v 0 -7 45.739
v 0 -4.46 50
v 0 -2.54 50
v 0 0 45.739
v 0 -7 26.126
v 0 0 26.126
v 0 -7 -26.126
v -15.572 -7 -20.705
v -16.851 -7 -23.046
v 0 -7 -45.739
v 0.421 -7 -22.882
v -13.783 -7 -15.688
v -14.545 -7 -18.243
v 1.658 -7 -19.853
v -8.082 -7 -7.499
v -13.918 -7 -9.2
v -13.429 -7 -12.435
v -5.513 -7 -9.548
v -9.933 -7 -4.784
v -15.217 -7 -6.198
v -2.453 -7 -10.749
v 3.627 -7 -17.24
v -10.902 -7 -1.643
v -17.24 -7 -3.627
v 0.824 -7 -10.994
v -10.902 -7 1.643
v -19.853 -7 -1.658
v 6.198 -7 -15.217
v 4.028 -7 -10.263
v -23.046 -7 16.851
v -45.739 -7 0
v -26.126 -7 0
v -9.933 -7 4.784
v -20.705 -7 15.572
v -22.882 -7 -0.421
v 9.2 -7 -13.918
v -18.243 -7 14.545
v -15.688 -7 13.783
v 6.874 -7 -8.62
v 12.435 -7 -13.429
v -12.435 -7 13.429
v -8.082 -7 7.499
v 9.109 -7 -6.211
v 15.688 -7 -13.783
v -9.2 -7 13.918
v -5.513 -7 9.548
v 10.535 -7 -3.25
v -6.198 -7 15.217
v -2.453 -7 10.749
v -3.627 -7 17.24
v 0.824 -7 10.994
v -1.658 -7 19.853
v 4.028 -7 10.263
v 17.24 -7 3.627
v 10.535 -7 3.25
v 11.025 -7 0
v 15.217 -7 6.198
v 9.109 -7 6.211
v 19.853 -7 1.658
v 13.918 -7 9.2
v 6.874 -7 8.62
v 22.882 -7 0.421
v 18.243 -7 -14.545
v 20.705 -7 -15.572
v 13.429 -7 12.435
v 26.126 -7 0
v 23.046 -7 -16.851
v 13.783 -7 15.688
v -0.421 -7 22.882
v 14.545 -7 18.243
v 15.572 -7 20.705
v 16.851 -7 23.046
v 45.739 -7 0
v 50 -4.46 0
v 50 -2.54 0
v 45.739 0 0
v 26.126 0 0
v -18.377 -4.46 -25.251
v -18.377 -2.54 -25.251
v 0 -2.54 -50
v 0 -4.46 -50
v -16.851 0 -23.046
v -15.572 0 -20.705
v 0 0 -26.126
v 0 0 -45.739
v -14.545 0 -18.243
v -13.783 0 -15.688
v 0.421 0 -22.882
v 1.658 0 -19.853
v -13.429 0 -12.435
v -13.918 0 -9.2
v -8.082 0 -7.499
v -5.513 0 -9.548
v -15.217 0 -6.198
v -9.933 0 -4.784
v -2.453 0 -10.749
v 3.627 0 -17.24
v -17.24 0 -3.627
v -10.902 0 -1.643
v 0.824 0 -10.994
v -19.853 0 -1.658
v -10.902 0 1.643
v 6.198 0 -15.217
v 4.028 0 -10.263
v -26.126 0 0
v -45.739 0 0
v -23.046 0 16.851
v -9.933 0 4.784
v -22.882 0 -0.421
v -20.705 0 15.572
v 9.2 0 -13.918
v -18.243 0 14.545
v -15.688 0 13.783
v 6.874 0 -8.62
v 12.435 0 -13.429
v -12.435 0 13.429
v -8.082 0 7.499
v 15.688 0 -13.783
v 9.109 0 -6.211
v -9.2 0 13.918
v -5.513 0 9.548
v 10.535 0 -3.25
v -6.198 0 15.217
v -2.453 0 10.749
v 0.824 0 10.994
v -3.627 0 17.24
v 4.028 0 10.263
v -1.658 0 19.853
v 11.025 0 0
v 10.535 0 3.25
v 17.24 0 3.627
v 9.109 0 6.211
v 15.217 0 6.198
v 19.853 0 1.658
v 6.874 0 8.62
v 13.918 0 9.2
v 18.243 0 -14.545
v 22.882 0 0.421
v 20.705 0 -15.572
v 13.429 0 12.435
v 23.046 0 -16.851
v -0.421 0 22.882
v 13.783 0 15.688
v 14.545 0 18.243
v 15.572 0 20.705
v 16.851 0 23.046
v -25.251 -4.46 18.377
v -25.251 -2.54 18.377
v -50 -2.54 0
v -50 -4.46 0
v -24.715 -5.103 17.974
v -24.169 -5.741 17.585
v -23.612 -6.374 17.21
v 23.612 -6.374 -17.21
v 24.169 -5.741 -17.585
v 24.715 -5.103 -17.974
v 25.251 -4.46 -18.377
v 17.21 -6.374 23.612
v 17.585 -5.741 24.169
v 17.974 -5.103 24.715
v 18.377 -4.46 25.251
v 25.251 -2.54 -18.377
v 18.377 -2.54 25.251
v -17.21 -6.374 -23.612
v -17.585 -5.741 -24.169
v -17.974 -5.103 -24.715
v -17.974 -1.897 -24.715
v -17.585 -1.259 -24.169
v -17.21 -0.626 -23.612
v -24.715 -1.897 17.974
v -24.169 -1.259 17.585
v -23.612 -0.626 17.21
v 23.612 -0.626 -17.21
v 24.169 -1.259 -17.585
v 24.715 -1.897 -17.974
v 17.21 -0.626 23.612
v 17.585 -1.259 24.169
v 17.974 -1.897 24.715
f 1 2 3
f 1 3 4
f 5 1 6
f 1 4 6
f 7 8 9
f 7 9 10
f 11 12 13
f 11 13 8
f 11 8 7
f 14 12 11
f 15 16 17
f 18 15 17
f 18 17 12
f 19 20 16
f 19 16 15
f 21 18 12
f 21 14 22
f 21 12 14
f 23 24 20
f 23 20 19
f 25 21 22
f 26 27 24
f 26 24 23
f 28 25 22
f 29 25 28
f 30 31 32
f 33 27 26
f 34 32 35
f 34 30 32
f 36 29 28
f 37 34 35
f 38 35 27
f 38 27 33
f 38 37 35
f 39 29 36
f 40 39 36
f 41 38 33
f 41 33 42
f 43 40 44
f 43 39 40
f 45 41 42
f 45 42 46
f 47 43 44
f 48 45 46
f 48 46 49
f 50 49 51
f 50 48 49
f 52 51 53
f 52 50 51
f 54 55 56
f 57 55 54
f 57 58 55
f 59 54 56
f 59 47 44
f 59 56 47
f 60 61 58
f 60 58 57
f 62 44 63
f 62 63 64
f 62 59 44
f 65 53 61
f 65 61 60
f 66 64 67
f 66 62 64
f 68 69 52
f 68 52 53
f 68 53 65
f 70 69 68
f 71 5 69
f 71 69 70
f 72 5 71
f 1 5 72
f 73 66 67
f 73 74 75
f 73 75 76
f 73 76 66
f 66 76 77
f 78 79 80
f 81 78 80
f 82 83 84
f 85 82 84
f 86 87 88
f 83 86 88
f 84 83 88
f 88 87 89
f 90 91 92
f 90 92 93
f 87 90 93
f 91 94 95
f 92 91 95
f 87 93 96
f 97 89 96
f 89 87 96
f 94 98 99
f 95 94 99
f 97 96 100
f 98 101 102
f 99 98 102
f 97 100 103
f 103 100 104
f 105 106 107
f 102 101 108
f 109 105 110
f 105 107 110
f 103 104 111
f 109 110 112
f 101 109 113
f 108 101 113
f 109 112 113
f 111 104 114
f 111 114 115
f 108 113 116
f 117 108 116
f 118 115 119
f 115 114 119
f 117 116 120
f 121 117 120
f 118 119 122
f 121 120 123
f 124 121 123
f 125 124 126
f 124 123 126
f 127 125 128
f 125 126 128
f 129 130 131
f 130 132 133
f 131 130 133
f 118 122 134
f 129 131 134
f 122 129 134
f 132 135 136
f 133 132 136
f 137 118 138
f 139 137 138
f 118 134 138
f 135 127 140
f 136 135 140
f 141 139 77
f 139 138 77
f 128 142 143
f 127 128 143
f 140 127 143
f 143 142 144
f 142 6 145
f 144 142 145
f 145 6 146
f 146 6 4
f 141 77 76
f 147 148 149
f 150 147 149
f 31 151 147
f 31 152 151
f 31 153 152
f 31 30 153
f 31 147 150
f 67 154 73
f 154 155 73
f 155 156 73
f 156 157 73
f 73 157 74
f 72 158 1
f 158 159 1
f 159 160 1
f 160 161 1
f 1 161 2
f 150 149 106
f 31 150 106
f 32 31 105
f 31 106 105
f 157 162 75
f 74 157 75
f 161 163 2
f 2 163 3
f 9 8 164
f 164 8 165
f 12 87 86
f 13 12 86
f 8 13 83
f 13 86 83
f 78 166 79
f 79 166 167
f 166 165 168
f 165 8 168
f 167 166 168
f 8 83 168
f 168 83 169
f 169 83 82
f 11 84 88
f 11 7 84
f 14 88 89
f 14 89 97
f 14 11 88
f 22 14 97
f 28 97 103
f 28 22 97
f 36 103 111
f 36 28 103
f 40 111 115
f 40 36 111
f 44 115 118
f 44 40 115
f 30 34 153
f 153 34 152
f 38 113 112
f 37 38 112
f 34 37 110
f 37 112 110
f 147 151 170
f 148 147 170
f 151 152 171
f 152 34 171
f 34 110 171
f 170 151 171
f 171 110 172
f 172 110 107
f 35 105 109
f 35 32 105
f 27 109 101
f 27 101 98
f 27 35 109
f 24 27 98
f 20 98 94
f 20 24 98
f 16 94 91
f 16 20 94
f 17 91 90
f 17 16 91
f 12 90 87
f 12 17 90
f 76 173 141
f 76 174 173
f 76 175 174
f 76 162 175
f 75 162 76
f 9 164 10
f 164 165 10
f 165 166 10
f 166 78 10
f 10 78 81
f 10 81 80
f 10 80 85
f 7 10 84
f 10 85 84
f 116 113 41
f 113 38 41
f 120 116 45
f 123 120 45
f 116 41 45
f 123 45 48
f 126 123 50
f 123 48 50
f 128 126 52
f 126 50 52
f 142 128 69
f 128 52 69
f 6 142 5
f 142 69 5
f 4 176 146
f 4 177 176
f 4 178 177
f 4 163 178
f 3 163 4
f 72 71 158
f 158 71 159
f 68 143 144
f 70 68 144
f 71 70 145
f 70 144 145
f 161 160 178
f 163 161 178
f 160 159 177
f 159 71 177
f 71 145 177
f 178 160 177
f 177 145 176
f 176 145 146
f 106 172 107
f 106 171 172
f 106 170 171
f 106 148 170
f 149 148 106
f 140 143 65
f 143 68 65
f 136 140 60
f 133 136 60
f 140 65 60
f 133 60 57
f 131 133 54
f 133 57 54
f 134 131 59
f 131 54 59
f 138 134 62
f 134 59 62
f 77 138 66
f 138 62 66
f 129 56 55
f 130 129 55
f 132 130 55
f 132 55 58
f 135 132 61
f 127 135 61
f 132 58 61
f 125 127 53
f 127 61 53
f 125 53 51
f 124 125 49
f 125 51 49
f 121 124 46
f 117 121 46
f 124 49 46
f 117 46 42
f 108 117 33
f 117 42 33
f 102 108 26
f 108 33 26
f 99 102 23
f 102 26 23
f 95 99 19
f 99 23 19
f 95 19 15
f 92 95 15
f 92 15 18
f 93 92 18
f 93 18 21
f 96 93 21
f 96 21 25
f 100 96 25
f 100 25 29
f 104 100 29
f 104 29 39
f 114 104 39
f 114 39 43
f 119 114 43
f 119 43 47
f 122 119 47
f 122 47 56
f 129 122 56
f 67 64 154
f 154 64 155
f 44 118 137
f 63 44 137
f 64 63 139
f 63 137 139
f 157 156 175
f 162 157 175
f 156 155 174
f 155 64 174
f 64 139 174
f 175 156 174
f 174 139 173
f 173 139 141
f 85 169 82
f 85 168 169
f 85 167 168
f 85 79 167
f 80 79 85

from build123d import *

# Parameters (mm, degrees)
F1_DEPTH = 7
F2_R     = 11.025
F3_DEPTH = 25.4
F4_R     = 12.7
F5_SIZE  = 2.54


with BuildPart() as f1:
    # F0 (on Front) → F1 (new body)
    with BuildSketch(Plane.XZ):
        with BuildLine():
            Line((-15, 0), (0, 0))
            Line((0, 0), (0, 15))
            ThreePointArc((0, 15), (-13.079524, 13.293907), (-25.25102, 18.377153))
            Line((-25.25102, 18.377153), (-50, 0))
            Line((-50, 0), (-15, 0))
        make_face()
        with BuildLine():
            Line((0, 15), (0, 0))
            Line((0, 0), (15, 0))
            ThreePointArc((15, 0), (13.293907, 13.079524), (18.377153, 25.25102))
            Line((18.377153, 25.25102), (0, 50))
            Line((0, 50), (0, 15))
        make_face()
        with BuildLine():
            Line((0, -15), (0, 0))
            Line((0, 0), (-15, 0))
            ThreePointArc((-15, 0), (-13.293907, -13.079524), (-18.377153, -25.25102))
            Line((-18.377153, -25.25102), (0, -50))
            Line((0, -50), (0, -15))
        make_face()
        with BuildLine():
            Line((15, 0), (0, 0))
            Line((0, 0), (0, -15))
            ThreePointArc((0, -15), (13.079524, -13.293907), (25.25102, -18.377153))
            Line((25.25102, -18.377153), (50, 0))
            Line((50, 0), (15, 0))
        make_face()
    extrude(amount=F1_DEPTH)

    # F2 (on face) → F3 (cut)
    with BuildSketch(Plane.XZ.offset(7)):
        Circle(F2_R)
    extrude(amount=-F3_DEPTH, mode=Mode.SUBTRACT)

    # F4
    f4_edges = [f1.edges().sort_by_distance(p)[0] for p in [
        (0, -3.5, 15),
        (15, -3.5, 0),
        (0, -3.5, -15),
        (-15, -3.5, 0),
    ]]
    fillet(f4_edges, radius=F4_R)

    # F5
    f5_edges = [f1.edges().sort_by_distance(p)[0] for p in [
        (37.62551, 0, -9.188577),
        (37.62551, -7, -9.188577),
        (9.188577, 0, 37.62551),
        (9.188577, -7, 37.62551),
        (-9.188577, 0, -37.62551),
        (-9.188577, -7, -37.62551),
        (-37.62551, 0, 9.188577),
        (-37.62551, -7, 9.188577),
    ]]
    chamfer(f5_edges, length=F5_SIZE)


solid = f1.part
